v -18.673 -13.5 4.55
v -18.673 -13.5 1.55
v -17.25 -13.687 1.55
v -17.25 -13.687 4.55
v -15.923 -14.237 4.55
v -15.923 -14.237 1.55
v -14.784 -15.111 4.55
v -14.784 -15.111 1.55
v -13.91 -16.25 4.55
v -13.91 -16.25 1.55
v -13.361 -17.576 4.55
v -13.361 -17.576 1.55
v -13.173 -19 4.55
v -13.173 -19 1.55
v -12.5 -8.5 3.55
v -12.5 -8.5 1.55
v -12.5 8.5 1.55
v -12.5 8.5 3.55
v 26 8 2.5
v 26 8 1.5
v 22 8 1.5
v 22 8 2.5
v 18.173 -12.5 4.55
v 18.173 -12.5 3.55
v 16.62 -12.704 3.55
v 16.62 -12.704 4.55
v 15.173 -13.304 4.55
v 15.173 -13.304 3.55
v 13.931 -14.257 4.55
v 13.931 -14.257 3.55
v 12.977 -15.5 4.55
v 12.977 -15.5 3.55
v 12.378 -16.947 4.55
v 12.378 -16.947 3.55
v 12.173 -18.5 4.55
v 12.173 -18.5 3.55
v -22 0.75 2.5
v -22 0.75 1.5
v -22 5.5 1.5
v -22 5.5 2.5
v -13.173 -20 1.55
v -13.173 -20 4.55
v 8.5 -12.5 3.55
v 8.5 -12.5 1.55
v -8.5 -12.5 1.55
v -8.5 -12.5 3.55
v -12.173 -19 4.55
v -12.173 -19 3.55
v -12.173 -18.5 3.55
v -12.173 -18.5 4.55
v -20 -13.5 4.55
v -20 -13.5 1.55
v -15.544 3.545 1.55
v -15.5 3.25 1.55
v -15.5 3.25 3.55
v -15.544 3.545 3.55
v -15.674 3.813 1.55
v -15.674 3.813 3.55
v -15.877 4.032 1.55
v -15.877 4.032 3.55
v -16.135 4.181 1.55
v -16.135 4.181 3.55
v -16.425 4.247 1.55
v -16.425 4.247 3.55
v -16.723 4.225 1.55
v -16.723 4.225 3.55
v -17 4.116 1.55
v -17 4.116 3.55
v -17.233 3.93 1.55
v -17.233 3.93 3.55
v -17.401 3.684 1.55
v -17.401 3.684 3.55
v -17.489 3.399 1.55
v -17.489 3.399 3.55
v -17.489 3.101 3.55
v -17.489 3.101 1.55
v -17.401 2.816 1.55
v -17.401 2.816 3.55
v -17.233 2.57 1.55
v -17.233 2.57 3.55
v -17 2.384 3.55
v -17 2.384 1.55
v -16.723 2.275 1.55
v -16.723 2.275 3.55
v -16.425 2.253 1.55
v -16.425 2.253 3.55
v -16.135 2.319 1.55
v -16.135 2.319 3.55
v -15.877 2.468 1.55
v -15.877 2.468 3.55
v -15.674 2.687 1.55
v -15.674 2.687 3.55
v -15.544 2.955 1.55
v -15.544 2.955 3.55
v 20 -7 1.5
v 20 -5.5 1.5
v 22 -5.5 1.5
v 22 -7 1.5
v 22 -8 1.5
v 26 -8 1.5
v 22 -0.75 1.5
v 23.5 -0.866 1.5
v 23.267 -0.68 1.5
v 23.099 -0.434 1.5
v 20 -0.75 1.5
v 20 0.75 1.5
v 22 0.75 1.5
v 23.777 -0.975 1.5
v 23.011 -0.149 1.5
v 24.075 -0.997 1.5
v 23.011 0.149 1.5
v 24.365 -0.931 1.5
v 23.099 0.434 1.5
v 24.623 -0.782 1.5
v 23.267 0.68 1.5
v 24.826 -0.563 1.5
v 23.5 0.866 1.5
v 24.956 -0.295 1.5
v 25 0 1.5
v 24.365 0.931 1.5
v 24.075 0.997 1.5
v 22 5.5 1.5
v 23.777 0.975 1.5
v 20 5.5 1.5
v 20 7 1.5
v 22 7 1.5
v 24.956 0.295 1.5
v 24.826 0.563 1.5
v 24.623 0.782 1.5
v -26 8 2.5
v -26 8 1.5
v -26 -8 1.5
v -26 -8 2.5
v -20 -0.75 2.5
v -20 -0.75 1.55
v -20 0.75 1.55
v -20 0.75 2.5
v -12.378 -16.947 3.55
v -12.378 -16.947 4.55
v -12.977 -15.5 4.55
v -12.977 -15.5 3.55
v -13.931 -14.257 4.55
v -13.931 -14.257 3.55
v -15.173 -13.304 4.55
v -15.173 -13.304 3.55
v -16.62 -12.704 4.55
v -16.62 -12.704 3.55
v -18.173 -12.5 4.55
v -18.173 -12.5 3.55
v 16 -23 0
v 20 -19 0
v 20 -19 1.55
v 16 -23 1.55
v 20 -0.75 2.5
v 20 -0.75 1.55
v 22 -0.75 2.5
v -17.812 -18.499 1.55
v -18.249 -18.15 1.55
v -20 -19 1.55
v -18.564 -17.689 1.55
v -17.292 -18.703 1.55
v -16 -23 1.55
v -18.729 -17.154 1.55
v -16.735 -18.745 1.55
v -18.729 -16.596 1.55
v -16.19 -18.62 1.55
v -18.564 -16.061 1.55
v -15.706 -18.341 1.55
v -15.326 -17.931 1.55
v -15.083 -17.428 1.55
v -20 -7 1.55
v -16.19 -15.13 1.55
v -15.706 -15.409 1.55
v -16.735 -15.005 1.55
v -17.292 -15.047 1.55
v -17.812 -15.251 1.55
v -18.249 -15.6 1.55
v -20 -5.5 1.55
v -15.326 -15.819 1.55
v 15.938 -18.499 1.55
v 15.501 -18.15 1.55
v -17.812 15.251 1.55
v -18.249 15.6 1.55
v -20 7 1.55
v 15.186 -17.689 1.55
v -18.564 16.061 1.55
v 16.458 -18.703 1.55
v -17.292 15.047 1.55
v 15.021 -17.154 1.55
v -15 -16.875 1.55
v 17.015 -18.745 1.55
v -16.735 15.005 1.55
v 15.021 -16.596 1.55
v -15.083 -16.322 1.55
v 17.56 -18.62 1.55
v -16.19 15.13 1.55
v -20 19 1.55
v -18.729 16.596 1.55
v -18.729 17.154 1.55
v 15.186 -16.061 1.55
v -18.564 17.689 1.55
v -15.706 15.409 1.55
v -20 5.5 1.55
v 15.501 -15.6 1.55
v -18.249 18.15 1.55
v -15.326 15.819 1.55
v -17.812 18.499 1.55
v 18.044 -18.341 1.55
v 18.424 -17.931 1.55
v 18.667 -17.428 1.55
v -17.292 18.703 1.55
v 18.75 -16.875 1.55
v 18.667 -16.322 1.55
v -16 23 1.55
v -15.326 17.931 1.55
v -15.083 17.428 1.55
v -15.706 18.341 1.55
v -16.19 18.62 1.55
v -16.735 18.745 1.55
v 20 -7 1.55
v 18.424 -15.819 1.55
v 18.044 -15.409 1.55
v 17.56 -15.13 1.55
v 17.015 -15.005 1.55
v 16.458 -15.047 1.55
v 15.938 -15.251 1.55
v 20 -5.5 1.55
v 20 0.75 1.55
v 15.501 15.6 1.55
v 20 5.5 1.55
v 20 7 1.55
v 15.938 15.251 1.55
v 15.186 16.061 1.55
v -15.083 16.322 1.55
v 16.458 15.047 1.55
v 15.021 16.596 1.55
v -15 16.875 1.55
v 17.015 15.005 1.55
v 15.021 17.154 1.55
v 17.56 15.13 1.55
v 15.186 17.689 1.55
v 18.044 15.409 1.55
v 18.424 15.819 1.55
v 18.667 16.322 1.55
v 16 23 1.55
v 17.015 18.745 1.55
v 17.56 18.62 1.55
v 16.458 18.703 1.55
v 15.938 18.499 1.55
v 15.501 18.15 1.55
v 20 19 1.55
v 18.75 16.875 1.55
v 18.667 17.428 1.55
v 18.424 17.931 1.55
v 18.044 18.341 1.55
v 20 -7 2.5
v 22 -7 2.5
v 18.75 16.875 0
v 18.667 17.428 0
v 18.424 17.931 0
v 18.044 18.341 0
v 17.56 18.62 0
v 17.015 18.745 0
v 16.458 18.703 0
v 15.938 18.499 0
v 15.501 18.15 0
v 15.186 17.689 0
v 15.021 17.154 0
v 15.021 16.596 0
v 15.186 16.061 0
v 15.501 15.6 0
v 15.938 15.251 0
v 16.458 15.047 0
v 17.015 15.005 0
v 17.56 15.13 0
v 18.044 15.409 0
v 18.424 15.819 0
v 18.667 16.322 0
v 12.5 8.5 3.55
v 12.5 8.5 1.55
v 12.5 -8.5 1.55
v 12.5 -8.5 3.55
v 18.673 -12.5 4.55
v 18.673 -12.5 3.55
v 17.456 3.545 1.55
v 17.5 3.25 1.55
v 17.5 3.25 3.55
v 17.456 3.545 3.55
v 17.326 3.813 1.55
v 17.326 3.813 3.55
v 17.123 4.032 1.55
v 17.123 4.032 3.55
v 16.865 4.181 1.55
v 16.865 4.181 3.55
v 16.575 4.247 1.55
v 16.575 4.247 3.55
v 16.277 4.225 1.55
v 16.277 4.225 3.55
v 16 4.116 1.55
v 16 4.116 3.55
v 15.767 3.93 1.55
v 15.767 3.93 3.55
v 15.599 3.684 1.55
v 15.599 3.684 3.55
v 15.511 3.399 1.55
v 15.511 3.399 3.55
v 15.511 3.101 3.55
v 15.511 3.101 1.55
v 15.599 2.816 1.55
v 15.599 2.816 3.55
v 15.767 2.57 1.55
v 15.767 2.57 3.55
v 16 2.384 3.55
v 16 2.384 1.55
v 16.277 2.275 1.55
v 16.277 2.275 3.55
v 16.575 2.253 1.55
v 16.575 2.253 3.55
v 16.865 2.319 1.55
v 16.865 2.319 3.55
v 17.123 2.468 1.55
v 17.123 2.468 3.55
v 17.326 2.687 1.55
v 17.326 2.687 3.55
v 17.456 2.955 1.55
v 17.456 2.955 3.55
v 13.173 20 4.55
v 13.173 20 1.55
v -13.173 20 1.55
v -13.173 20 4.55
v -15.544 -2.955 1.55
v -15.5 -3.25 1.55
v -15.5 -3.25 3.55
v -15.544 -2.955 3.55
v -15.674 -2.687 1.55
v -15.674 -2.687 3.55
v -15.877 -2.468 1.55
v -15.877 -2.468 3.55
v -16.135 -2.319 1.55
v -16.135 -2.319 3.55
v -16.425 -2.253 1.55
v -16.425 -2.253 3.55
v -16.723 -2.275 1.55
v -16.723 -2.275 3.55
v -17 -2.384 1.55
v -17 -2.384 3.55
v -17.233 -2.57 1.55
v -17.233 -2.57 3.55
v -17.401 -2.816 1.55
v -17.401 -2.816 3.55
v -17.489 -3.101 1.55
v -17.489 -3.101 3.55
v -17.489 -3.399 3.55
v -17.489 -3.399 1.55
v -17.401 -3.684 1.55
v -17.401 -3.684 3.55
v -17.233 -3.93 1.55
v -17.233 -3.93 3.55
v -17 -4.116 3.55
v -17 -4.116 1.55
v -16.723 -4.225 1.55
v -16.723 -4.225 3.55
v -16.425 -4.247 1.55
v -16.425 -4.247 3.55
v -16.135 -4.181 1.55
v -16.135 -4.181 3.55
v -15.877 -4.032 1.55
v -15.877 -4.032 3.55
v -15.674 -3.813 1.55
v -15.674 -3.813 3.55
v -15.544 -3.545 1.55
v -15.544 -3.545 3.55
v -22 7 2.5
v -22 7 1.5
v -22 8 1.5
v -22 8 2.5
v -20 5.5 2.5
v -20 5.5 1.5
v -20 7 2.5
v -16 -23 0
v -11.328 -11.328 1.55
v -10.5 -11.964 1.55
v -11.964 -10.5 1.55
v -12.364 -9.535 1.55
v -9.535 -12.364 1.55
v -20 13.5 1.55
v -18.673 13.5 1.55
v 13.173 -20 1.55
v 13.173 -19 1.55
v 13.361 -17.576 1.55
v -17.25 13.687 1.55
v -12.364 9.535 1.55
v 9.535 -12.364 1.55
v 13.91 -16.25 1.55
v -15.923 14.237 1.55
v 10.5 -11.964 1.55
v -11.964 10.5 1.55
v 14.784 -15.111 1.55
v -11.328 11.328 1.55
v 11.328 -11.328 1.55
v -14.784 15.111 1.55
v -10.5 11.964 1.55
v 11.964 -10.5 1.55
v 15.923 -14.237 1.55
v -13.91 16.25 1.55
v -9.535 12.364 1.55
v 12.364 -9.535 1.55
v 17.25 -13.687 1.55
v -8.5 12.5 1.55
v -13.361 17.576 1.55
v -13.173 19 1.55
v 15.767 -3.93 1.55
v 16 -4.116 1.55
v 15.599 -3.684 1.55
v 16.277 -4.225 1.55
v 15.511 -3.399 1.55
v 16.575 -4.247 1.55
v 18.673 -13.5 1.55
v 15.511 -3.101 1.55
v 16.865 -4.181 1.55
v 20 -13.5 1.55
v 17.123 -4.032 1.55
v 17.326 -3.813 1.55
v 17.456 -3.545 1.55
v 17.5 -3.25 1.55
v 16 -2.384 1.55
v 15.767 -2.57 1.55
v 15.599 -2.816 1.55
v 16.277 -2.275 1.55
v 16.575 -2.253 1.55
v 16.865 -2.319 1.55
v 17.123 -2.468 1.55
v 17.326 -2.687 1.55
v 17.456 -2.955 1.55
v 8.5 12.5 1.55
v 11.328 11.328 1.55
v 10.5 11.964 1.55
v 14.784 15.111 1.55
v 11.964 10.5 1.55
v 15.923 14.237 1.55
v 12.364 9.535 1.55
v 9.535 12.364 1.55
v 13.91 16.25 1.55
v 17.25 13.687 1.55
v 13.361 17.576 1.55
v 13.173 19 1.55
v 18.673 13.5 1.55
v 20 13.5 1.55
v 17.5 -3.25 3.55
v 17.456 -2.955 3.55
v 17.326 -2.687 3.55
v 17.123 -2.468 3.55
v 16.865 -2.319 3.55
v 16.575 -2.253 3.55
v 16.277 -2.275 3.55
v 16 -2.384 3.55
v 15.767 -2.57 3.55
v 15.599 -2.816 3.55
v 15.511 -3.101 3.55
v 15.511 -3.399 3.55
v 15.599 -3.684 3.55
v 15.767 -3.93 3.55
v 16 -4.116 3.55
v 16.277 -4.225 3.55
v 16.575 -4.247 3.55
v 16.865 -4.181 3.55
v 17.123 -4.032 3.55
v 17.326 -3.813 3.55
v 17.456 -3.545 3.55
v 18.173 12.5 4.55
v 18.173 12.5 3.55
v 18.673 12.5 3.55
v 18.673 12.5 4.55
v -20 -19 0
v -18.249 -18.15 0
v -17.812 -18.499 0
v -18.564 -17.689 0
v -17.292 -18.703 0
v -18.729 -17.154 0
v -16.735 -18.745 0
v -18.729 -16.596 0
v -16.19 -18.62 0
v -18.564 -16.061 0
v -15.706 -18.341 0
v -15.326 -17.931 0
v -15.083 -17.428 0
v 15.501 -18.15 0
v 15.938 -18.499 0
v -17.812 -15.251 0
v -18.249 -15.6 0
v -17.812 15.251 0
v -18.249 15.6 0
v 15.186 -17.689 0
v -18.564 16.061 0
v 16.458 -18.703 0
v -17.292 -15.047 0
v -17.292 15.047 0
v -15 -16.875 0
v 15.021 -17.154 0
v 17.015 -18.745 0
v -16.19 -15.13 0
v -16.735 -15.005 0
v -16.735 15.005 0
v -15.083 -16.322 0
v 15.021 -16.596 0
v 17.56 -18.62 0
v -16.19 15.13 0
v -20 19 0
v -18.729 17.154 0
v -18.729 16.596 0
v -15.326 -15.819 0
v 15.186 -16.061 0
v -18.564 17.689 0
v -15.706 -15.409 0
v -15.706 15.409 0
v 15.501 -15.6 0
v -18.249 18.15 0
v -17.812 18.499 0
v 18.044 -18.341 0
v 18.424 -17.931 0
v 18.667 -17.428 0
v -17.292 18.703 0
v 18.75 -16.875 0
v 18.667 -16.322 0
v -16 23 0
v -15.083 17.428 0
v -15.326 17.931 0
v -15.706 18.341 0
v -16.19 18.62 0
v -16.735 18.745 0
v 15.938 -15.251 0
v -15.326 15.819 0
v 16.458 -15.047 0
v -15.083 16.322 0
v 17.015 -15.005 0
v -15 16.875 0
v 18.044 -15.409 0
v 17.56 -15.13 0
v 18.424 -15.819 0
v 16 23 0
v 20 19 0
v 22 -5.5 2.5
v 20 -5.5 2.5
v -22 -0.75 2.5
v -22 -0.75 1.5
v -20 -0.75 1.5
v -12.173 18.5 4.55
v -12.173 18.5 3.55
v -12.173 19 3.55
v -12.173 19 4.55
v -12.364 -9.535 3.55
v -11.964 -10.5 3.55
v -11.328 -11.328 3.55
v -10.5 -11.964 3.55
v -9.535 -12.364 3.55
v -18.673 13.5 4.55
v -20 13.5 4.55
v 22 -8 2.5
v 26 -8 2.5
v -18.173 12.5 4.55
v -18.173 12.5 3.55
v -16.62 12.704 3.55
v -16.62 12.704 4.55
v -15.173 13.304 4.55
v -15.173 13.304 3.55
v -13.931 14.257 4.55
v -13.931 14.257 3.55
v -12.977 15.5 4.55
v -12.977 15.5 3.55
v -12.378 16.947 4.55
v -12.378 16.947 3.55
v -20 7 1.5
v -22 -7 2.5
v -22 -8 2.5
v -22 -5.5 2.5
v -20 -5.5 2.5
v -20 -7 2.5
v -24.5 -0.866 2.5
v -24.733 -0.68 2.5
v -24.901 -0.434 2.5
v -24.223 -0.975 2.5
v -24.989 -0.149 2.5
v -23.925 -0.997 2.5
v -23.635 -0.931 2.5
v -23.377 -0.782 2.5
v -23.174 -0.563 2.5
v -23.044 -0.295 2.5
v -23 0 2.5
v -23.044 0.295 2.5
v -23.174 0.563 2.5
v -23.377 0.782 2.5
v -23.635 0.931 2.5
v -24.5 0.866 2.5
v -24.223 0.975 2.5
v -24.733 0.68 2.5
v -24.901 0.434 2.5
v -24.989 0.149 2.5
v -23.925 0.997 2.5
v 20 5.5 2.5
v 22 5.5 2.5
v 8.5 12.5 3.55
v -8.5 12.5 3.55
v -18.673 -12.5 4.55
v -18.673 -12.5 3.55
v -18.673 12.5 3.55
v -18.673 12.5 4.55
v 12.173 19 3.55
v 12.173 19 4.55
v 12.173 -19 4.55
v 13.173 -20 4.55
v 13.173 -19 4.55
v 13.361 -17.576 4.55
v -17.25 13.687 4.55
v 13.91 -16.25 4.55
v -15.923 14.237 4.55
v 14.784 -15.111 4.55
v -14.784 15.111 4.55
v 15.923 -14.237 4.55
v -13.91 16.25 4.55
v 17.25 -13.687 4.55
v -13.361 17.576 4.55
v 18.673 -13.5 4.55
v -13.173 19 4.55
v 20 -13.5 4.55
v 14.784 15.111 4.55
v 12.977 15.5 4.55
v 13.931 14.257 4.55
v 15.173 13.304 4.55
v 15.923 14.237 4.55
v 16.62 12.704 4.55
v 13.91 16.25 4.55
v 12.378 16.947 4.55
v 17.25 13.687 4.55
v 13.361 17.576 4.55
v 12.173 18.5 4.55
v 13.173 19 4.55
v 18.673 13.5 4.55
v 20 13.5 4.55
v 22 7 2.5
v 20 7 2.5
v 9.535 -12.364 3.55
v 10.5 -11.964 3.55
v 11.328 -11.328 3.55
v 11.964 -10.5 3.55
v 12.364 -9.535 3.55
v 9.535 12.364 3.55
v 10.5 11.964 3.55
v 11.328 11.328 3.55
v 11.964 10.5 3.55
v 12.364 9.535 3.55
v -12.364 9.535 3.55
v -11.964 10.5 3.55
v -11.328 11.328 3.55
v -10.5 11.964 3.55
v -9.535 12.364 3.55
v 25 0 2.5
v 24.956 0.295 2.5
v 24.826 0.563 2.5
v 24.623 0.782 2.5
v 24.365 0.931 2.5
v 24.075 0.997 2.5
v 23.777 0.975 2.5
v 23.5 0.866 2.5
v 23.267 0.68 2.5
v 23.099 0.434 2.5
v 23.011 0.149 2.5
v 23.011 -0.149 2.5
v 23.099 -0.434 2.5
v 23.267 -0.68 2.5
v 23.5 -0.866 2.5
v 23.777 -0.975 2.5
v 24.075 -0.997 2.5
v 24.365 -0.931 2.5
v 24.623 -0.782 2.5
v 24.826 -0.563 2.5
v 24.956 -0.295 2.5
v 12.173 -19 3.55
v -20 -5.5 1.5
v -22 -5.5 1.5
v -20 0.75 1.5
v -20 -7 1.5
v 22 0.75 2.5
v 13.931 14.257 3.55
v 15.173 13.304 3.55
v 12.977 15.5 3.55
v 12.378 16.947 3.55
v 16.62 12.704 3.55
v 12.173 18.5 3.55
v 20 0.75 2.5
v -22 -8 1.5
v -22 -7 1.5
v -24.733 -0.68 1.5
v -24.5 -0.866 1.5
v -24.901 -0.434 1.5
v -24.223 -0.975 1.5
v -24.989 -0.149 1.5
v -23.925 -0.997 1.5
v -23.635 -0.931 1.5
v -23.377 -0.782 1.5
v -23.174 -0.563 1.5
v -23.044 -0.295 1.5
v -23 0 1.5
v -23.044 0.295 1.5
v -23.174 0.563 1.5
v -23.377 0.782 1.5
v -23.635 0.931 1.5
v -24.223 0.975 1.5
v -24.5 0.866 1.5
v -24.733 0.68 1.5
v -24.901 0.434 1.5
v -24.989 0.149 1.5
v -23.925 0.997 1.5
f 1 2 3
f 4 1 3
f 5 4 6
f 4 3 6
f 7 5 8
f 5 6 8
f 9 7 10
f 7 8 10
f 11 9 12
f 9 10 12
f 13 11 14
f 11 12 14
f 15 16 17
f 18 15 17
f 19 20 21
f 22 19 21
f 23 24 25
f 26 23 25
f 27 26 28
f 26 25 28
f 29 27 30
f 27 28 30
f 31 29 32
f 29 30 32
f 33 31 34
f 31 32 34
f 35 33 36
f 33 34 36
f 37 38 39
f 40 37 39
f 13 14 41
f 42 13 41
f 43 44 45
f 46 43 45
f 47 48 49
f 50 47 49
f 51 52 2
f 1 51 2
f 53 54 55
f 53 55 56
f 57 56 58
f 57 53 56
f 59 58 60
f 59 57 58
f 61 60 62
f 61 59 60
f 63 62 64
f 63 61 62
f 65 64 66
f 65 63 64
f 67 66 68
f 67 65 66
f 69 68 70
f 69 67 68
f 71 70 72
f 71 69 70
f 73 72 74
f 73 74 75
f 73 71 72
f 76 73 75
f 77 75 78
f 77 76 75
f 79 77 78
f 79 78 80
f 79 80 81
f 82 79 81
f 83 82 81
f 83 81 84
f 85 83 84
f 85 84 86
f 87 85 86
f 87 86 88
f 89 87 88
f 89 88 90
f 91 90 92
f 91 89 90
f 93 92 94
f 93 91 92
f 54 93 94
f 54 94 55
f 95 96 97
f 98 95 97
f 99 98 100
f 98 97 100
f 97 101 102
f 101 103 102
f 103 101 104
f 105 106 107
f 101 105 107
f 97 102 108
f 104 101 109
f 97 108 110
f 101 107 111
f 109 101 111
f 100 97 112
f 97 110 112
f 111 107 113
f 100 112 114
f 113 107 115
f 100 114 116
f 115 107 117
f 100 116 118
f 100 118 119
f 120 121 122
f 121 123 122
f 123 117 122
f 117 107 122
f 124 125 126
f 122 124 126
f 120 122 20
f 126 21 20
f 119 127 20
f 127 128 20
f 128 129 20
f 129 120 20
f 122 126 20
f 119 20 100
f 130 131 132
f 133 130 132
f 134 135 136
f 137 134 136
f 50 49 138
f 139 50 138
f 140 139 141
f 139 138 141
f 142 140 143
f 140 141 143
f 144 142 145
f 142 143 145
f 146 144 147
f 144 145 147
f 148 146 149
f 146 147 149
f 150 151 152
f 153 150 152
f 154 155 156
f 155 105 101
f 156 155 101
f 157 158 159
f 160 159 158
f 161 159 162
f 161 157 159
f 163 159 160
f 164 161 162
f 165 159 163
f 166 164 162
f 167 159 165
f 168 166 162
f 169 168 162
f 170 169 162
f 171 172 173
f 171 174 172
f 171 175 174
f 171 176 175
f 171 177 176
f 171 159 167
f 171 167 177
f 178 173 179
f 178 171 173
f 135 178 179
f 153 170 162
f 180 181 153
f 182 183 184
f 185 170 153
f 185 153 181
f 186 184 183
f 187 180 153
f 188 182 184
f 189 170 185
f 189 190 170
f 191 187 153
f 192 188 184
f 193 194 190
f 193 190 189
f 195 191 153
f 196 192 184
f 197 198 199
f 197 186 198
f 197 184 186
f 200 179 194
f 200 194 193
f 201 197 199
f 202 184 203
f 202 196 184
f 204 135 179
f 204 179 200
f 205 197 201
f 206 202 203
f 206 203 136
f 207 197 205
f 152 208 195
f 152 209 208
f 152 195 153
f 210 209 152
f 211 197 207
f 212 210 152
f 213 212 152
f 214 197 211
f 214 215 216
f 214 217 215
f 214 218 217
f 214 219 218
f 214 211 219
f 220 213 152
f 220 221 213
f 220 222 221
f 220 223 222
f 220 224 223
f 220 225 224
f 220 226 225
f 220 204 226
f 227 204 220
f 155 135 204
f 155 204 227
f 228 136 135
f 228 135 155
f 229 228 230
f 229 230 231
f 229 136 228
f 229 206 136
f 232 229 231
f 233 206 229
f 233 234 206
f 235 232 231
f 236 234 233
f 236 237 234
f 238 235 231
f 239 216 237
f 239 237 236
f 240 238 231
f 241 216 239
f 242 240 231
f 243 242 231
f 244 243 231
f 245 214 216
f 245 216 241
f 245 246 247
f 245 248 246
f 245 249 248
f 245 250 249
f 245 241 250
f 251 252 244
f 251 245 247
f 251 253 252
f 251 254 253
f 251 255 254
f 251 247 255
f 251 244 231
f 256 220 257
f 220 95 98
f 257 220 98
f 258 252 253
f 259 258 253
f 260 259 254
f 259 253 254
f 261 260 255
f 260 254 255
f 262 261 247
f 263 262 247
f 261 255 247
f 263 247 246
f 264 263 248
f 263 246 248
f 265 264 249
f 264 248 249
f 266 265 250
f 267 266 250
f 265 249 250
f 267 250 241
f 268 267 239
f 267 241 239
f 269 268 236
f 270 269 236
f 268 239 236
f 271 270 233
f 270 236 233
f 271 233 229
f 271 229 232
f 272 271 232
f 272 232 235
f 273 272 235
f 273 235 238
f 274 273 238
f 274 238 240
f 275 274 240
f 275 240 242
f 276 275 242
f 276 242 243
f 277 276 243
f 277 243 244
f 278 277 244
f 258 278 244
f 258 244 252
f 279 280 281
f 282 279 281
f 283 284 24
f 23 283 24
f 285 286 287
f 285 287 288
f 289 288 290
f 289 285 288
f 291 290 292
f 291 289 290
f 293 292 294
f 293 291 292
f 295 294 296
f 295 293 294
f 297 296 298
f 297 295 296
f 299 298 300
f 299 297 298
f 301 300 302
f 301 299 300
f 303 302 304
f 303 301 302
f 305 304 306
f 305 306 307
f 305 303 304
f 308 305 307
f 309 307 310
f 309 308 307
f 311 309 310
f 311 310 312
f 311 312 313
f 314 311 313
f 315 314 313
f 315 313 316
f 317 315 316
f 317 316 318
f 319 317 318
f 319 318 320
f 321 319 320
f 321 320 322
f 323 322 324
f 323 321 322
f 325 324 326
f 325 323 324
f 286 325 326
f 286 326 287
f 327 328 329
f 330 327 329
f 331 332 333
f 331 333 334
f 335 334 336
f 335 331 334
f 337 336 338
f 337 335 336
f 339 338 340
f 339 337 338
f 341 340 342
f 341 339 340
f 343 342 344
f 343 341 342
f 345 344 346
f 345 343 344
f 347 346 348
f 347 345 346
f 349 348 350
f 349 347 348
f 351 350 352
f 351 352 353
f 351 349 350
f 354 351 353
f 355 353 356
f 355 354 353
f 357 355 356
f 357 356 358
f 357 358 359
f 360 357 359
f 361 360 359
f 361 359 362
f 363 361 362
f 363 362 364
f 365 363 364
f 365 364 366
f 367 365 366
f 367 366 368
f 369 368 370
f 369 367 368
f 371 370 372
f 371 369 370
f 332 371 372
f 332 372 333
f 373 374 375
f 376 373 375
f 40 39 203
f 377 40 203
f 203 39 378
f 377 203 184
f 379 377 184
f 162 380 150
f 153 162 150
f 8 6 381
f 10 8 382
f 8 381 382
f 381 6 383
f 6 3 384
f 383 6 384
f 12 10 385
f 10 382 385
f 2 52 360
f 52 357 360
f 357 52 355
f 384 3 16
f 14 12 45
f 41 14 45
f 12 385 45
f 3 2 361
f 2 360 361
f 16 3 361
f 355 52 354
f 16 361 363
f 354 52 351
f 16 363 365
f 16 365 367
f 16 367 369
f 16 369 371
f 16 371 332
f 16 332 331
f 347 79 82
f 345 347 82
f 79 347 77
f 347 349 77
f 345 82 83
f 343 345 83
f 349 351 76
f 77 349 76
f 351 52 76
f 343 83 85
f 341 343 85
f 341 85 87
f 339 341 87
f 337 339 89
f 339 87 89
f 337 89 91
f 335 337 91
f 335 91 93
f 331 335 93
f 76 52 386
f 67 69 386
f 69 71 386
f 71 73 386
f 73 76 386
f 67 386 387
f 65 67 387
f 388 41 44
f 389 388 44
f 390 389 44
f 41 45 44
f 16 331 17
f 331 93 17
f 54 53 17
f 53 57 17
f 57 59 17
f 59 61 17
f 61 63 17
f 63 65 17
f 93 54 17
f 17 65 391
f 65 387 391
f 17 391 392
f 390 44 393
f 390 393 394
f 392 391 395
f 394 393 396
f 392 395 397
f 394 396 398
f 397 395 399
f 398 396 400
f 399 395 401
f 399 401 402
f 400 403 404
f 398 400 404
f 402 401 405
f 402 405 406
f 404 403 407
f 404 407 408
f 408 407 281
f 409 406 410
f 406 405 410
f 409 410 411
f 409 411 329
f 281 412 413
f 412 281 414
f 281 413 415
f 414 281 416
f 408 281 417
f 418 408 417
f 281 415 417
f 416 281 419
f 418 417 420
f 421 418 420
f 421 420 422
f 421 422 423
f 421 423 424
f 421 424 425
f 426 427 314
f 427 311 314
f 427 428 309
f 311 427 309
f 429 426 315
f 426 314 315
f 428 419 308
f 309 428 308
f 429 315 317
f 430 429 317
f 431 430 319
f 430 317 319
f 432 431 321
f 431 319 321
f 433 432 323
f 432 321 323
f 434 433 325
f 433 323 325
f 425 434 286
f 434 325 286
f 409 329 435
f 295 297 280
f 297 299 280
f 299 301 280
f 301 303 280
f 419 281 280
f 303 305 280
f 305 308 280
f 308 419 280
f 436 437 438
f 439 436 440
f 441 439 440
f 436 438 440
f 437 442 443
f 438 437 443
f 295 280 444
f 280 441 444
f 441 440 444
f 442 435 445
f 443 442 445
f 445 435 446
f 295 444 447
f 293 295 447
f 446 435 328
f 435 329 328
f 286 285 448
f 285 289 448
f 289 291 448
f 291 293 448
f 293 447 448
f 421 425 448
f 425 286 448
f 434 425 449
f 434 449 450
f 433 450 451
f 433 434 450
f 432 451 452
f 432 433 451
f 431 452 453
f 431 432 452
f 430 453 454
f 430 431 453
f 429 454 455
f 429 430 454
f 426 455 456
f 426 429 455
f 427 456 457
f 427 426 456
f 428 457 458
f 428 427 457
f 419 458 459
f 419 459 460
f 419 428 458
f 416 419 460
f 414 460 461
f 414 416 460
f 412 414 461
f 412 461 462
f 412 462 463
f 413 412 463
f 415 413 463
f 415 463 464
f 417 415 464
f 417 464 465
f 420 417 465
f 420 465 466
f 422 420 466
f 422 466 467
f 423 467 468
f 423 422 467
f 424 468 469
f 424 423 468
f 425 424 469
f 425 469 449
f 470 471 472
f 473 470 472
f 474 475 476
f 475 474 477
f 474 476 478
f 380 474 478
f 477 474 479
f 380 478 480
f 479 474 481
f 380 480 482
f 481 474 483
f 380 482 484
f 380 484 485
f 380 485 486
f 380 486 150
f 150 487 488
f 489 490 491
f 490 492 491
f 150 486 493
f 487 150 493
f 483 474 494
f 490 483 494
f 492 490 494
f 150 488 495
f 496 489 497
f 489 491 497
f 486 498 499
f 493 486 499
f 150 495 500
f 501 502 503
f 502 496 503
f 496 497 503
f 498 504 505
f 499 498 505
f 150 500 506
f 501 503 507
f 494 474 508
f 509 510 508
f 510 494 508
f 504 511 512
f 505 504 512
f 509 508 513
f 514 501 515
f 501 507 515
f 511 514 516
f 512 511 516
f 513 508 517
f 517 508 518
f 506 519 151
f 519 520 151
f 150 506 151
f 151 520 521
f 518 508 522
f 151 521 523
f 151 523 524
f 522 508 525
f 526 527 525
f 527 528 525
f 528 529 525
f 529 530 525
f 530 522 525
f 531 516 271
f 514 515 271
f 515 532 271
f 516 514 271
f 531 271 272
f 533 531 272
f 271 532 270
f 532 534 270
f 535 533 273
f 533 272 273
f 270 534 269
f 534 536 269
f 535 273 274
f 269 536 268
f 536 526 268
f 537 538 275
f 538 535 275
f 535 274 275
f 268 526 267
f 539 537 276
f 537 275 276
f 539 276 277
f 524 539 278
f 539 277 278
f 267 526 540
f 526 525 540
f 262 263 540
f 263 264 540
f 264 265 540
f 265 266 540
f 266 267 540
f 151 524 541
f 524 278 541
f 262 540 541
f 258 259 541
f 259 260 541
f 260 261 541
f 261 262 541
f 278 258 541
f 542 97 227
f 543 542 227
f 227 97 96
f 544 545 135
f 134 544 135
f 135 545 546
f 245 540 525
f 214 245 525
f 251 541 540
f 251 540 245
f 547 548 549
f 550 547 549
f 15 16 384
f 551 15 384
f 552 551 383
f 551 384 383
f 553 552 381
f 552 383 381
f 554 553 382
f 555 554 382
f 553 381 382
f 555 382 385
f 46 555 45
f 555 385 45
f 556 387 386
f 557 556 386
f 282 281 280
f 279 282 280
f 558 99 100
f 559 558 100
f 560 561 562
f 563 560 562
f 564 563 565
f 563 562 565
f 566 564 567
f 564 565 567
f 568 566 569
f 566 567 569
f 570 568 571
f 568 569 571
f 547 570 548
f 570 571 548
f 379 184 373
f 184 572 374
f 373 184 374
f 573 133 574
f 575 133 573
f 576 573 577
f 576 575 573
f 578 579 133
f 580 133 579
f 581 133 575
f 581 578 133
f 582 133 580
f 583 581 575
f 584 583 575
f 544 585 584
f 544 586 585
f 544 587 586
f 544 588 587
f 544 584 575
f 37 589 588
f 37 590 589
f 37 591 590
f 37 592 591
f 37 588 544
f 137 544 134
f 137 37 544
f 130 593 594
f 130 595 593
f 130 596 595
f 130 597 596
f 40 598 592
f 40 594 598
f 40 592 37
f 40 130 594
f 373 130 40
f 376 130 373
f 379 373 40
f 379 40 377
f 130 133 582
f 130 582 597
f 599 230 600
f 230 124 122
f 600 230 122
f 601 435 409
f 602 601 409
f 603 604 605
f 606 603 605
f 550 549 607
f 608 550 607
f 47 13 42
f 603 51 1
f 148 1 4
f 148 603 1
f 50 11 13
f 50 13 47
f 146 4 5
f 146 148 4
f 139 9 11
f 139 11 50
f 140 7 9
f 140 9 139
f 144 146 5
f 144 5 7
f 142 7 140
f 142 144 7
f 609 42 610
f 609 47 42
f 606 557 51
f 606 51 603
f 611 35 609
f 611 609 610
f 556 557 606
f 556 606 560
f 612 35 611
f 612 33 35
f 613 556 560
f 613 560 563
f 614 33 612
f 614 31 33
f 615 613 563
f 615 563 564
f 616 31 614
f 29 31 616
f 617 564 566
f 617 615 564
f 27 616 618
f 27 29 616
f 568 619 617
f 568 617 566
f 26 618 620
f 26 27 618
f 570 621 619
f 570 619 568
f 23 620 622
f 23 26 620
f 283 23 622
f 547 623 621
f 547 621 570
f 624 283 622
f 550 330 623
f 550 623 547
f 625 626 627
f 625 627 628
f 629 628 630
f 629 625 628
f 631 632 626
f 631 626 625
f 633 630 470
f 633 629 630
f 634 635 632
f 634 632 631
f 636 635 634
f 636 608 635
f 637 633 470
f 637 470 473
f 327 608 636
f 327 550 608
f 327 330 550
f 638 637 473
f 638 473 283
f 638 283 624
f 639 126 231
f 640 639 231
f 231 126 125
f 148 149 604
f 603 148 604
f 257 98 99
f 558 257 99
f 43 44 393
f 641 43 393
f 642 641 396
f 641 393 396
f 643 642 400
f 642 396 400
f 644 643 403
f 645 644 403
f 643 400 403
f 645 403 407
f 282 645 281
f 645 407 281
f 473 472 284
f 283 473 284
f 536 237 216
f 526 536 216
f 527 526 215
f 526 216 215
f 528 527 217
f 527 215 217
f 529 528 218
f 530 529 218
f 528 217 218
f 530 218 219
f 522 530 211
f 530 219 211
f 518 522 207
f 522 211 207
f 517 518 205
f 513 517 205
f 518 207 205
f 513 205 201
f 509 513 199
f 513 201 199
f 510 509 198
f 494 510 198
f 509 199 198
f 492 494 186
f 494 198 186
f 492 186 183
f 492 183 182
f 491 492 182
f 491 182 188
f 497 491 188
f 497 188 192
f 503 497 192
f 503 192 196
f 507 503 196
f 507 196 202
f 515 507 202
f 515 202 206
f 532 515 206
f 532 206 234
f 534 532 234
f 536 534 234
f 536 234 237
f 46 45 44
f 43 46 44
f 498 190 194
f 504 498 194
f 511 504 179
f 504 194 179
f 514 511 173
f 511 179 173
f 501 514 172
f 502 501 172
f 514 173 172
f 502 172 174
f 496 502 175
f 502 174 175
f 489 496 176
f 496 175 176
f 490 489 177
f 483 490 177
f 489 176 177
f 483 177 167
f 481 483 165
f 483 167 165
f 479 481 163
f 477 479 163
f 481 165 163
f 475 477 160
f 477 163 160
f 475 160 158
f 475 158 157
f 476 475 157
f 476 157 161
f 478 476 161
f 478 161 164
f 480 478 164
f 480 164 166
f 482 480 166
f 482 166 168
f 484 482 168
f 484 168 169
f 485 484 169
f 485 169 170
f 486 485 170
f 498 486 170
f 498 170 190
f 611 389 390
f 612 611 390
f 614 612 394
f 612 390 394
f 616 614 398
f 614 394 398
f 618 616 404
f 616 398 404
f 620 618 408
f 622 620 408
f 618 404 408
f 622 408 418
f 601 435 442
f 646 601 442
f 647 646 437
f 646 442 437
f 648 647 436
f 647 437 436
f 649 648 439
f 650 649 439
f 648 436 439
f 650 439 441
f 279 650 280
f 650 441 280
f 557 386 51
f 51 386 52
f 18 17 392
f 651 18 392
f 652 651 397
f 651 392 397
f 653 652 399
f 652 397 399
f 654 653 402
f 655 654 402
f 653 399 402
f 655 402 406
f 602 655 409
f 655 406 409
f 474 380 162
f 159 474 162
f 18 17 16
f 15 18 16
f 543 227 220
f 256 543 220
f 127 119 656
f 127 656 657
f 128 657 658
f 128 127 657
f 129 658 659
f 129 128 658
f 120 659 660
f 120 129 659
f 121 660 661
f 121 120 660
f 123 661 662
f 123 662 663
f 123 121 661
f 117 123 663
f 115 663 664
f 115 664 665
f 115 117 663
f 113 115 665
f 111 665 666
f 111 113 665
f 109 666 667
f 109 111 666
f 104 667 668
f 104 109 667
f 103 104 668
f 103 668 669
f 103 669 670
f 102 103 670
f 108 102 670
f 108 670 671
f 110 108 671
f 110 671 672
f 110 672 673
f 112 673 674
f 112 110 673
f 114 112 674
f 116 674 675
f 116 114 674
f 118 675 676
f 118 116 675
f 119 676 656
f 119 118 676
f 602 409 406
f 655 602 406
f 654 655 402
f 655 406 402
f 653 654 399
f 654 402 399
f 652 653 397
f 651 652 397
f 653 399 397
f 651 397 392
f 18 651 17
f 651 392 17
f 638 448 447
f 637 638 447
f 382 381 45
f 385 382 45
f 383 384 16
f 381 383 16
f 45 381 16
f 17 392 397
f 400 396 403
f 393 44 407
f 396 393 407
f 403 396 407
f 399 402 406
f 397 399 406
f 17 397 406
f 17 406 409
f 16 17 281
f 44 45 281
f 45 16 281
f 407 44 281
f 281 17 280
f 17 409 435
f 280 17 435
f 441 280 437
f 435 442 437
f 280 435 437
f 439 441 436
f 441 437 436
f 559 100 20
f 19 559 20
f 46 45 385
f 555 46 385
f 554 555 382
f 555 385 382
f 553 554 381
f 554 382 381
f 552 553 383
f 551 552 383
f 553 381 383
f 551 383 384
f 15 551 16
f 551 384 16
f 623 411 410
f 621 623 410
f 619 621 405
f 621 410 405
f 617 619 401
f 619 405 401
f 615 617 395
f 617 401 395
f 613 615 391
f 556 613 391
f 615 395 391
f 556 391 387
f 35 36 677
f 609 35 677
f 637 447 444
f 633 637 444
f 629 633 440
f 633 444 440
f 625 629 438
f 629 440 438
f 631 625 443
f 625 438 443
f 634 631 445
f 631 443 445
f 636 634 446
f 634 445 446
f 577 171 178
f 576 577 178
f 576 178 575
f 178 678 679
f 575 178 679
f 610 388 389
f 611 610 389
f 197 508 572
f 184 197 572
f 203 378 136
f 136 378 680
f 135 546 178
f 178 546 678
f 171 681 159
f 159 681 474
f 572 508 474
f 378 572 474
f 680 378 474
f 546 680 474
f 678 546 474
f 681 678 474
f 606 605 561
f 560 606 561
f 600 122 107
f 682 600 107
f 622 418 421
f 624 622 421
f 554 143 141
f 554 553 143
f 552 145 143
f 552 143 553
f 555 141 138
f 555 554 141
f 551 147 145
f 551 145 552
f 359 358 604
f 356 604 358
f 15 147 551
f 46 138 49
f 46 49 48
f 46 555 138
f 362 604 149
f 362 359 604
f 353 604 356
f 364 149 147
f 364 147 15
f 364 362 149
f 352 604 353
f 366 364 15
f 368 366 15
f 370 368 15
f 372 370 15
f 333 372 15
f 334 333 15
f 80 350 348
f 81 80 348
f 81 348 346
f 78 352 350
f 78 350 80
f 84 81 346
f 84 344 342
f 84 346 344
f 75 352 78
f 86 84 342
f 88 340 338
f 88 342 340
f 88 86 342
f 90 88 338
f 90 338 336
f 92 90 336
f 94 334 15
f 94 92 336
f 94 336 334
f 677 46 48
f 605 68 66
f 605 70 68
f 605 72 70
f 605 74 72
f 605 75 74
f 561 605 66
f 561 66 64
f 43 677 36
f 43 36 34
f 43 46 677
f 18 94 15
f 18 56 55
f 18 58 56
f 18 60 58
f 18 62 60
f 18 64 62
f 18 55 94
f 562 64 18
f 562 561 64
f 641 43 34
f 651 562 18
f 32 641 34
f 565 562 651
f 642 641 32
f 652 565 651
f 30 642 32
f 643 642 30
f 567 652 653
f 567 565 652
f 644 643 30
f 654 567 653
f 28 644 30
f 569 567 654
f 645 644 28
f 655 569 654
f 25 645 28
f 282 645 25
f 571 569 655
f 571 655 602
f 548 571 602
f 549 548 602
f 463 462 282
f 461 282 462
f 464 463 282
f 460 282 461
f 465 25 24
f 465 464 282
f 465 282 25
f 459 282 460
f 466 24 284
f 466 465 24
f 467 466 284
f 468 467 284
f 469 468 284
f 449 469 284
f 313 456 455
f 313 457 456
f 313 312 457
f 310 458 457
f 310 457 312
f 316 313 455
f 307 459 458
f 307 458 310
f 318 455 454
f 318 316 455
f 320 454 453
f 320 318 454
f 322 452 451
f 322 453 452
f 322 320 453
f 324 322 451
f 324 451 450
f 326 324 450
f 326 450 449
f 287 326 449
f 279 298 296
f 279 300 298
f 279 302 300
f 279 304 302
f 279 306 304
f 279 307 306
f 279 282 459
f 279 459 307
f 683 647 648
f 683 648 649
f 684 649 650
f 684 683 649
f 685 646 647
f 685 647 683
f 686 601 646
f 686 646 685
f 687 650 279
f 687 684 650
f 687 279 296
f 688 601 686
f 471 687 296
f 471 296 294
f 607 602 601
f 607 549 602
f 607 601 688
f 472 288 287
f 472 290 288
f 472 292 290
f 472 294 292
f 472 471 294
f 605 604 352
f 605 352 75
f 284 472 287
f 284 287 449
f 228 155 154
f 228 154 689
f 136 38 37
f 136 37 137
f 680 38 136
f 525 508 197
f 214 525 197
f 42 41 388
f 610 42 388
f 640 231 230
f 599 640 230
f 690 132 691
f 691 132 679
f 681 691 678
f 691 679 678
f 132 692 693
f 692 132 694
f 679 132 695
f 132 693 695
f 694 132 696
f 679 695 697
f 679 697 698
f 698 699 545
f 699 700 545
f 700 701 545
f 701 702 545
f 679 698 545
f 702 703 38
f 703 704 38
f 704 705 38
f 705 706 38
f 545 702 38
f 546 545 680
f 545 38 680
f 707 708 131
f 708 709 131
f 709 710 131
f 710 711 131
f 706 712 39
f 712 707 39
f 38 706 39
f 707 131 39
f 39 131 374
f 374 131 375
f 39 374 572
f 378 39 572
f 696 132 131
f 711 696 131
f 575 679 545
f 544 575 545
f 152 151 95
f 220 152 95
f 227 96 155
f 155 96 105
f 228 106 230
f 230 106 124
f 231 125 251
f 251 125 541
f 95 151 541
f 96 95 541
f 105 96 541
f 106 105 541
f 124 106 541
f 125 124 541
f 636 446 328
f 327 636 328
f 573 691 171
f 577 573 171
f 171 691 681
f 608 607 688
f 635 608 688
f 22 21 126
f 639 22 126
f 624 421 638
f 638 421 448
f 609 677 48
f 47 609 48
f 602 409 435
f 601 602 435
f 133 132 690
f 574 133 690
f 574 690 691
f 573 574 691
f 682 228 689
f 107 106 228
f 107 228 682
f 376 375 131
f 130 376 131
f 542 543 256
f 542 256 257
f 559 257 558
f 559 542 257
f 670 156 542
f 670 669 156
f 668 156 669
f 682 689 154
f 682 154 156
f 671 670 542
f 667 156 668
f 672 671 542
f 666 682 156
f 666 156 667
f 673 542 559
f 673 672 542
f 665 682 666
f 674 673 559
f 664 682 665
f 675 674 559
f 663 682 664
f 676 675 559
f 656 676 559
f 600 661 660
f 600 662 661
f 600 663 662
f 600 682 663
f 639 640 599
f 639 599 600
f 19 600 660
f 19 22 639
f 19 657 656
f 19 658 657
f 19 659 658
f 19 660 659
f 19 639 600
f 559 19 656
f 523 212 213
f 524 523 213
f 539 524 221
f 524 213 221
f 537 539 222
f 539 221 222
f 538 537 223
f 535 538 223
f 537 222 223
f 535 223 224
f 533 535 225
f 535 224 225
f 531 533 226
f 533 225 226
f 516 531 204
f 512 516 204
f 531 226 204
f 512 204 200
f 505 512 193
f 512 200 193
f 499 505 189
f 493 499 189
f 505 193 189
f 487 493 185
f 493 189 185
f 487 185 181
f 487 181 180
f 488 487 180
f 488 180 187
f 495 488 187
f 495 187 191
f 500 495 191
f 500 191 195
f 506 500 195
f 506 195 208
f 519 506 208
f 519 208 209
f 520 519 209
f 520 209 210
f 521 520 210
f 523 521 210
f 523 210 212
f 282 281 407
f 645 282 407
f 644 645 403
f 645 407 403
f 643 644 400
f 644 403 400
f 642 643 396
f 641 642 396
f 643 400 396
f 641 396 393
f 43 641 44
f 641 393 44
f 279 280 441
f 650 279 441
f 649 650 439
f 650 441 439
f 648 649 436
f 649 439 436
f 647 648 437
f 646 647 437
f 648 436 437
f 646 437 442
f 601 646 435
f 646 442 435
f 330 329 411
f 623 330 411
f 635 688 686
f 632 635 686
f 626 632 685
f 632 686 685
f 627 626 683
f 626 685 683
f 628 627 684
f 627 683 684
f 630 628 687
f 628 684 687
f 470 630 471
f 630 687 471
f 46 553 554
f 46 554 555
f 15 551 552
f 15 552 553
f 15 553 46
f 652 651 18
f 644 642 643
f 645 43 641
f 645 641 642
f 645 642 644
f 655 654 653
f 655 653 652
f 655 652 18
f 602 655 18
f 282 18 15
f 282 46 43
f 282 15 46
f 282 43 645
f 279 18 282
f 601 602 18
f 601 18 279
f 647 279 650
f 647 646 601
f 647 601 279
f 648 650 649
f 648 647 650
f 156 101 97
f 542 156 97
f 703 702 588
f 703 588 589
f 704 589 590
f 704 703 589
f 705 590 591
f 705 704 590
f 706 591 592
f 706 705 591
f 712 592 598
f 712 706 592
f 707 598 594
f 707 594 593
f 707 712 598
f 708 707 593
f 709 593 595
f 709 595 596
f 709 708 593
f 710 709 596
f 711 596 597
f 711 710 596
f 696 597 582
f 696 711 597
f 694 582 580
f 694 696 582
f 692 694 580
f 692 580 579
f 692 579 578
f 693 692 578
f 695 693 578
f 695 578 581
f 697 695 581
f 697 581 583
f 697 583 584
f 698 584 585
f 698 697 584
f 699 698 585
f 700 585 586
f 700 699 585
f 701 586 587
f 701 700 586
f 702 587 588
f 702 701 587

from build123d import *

# Parameters (mm, degrees)
F1_DEPTH = 1.55
F3_SIZE  = 4
F4_R     = 1.875
F5_DEPTH = 4
F6_DEPTH = 3
F2_R     = 1
F2_W     = 1.5
F2_H     = 0.5
F2_W_2   = 0.5
F2_H_2   = 1.5219762474
F2_H_3   = 1.4780237526
F7_DEPTH = 2
F8_DEPTH = 2
F9_START = 1.5
F0_R     = 1
F0_W     = 2
F0_H     = 1.5
F9_DEPTH = 1


with BuildPart() as f1:
    # F0 (on Top) → F1 (new body)
    with BuildSketch(Plane.XY):
        Polygon((20, 23), (-20, 23), (-20, 7), (-20, 5.5), (-20, 0.75), (-20, -0.75), (-20, -5.5), (-20, -7), (-20, -23), (20, -23), (20, -7), (20, -5.5), (20, -0.75), (20, 0.75), (20, 5.5), (20, 7), align=None)
    extrude(amount=F1_DEPTH)

    # F3
    f3_edges = [f1.edges().sort_by_distance(p)[0] for p in [
        (-20, 23, 0.775),
        (20, 23, 0.775),
        (20, -23, 0.775),
        (-20, -23, 0.775),
    ]]
    chamfer(f3_edges, length=F3_SIZE)

    # F4 (on face) → F5 (cut)
    with BuildSketch(Plane.XY.offset(1.55)):
        with Locations((-16.875, -16.875)):
            Circle(F4_R)
        with Locations((16.875, -16.875)):
            Circle(F4_R)
        with Locations((16.875, 16.875)):
            Circle(F4_R)
        with Locations((-16.875, 16.875)):
            Circle(F4_R)
    extrude(amount=-F5_DEPTH, mode=Mode.SUBTRACT)

    # F0 (on Top) → F9 (join)
    with BuildSketch(Plane.XY.offset(F9_START)):
        Polygon((-20, 5.5), (-20, 7), (-22, 7), (-22, 8), (-26, 8), (-26, -8), (-22, -8), (-22, -7), (-20, -7), (-20, -5.5), (-22, -5.5), (-22, -0.75), (-22, 0.75), (-22, 5.5), align=None)
        with Locations((-24, 0)):
            Circle(F0_R, mode=Mode.SUBTRACT)
        Polygon((22, 7), (20, 7), (20, 5.5), (22, 5.5), (22, 0.75), (22, -0.75), (22, -5.5), (20, -5.5), (20, -7), (22, -7), (22, -8), (26, -8), (26, 8), (22, 8), align=None)
        with Locations((24, 0)):
            Circle(F0_R, mode=Mode.SUBTRACT)
        with Locations((21, 0)):
            Rectangle(F0_W, F0_H)
        with Locations((-21, 0)):
            Rectangle(F0_W, F0_H)
    extrude(amount=F9_DEPTH)


with BuildPart() as f6:
    # F2 (on face) → F6 (new body)
    with BuildSketch(Plane.XY.offset(1.55)):
        with BuildLine():
            Line((13.1731458455, 20), (-13.1731458455, 20))
            Line((-13.1731458455, 20), (-13.1731458455, 19))
            ThreePointArc((-13.1731458455, 19), (-14.784058549, 15.1109127035), (-18.6731458455, 13.5))
            Line((-18.6731458455, 13.5), (-20, 13.5))
            Line((-20, 13.5), (-20, -13.5))
            Line((-20, -13.5), (-18.6731458455, -13.5))
            ThreePointArc((-18.6731458455, -13.5), (-14.784058549, -15.1109127035), (-13.1731458455, -19))
            Line((-13.1731458455, -19), (-13.1731458455, -20))
            Line((-13.1731458455, -20), (13.1731458455, -20))
            Line((13.1731458455, -20), (13.1731458455, -19))
            ThreePointArc((13.1731458455, -19), (14.784058549, -15.1109127035), (18.6731458455, -13.5))
            Line((18.6731458455, -13.5), (20, -13.5))
            Line((20, -13.5), (20, 13.5))
            Line((20, 13.5), (18.6731458455, 13.5))
            ThreePointArc((18.6731458455, 13.5), (14.784058549, 15.1109127035), (13.1731458455, 19))
            Line((13.1731458455, 19), (13.1731458455, 20))
        make_face()
        with BuildLine():
            Line((-12.1731458455, 18.5), (-12.1731458455, 19))
            Line((-12.1731458455, 19), (12.1731458455, 19))
            Line((12.1731458455, 19), (12.1731458455, 18.5))
            ThreePointArc((12.1731458455, 18.5), (13.9305051584, 14.2573593129), (18.1731458455, 12.5))
            Line((18.1731458455, 12.5), (18.6731458455, 12.5))
            Line((18.6731458455, 12.5), (18.6731458455, -12.5))
            Line((18.6731458455, -12.5), (18.1731458455, -12.5))
            ThreePointArc((18.1731458455, -12.5), (13.9305051584, -14.2573593129), (12.1731458455, -18.5))
            Line((12.1731458455, -18.5), (12.1731458455, -19))
            Line((12.1731458455, -19), (-12.1731458455, -19))
            Line((-12.1731458455, -19), (-12.1731458455, -18.5))
            ThreePointArc((-12.1731458455, -18.5), (-13.9305051584, -14.2573593129), (-18.1731458455, -12.5))
            Line((-18.1731458455, -12.5), (-18.6731458455, -12.5))
            Line((-18.6731458455, -12.5), (-18.6731458455, 12.5))
            Line((-18.6731458455, 12.5), (-18.1731458455, 12.5))
            ThreePointArc((-18.1731458455, 12.5), (-13.9305051584, 14.2573593129), (-12.1731458455, 18.5))
        make_face(mode=Mode.SUBTRACT)
    extrude(amount=F6_DEPTH)

    # F2 (on face) → F7 (join)
    with BuildSketch(Plane.XY.offset(1.55)):
        with BuildLine():
            Line((12.1731458455, 19), (-12.1731458455, 19))
            Line((-12.1731458455, 19), (-12.1731458455, 18.5))
            ThreePointArc((-12.1731458455, 18.5), (-13.9305051584, 14.2573593129), (-18.1731458455, 12.5))
            Line((-18.1731458455, 12.5), (-18.6731458455, 12.5))
            Line((-18.6731458455, 12.5), (-18.6731458455, -12.5))
            Line((-18.6731458455, -12.5), (-18.1731458455, -12.5))
            ThreePointArc((-18.1731458455, -12.5), (-13.9305051584, -14.2573593129), (-12.1731458455, -18.5))
            Line((-12.1731458455, -18.5), (-12.1731458455, -19))
            Line((-12.1731458455, -19), (12.1731458455, -19))
            Line((12.1731458455, -19), (12.1731458455, -18.5))
            ThreePointArc((12.1731458455, -18.5), (13.9305051584, -14.2573593129), (18.1731458455, -12.5))
            Line((18.1731458455, -12.5), (18.6731458455, -12.5))
            Line((18.6731458455, -12.5), (18.6731458455, 12.5))
            Line((18.6731458455, 12.5), (18.1731458455, 12.5))
            ThreePointArc((18.1731458455, 12.5), (13.9305051584, 14.2573593129), (12.1731458455, 18.5))
            Line((12.1731458455, 18.5), (12.1731458455, 19))
        make_face()
        Polygon((-9.1731458455, -16.4780237526), (-9.1731458455, -18), (-9.6731458455, -18), (-9.6731458455, -16.4780237526), (-11.1731458455, -16.4780237526), (-11.1731458455, -15.9780237526), (-9.6731458455, -15.9780237526), (-9.6731458455, -14.5), (-9.1731458455, -14.5), (-9.1731458455, -15.9780237526), (-7.6731458455, -15.9780237526), (-7.6731458455, -16.4780237526), align=None, mode=Mode.SUBTRACT)
        with Locations((-16.5, -3.25)):
            Circle(F2_R, mode=Mode.SUBTRACT)
        with Locations((16.5, -3.25)):
            Circle(F2_R, mode=Mode.SUBTRACT)
        with Locations((-16.5, 3.25)):
            Circle(F2_R, mode=Mode.SUBTRACT)
        with BuildLine():
            ThreePointArc((-12.5, 8.5), (-11.3284271247, 11.3284271247), (-8.5, 12.5))
            Line((-8.5, 12.5), (8.5, 12.5))
            ThreePointArc((8.5, 12.5), (11.3284271247, 11.3284271247), (12.5, 8.5))
            Line((12.5, 8.5), (12.5, -8.5))
            ThreePointArc((12.5, -8.5), (11.3284271247, -11.3284271247), (8.5, -12.5))
            Line((8.5, -12.5), (-8.5, -12.5))
            ThreePointArc((-8.5, -12.5), (-11.3284271247, -11.3284271247), (-12.5, -8.5))
            Line((-12.5, -8.5), (-12.5, 8.5))
        make_face(mode=Mode.SUBTRACT)
        with Locations((16.5, 3.25)):
            Circle(F2_R, mode=Mode.SUBTRACT)
        with Locations((-8.4231458455, -16.2280237526)):
            Rectangle(F2_W, F2_H)
        with Locations((-10.4231458455, -16.2280237526)):
            Rectangle(F2_W, F2_H)
        with Locations((-9.4231458455, -17.2390118763)):
            Rectangle(F2_W_2, F2_H_2)
        with Locations((-9.4231458455, -15.2390118763)):
            Rectangle(F2_W_2, F2_H_3)
        with Locations((-9.4231458455, -16.2280237526)):
            Rectangle(F2_W_2, F2_H)
    extrude(amount=F7_DEPTH)


with BuildPart() as f8:
    # F2 (on face) → F8 (new body)
    with BuildSketch(Plane.XY.offset(1.55)):
        with BuildLine():
            Line((8.5, 12.5), (-8.5, 12.5))
            ThreePointArc((-8.5, 12.5), (-11.3284271247, 11.3284271247), (-12.5, 8.5))
            Line((-12.5, 8.5), (-12.5, -8.5))
            ThreePointArc((-12.5, -8.5), (-11.3284271247, -11.3284271247), (-8.5, -12.5))
            Line((-8.5, -12.5), (8.5, -12.5))
            ThreePointArc((8.5, -12.5), (11.3284271247, -11.3284271247), (12.5, -8.5))
            Line((12.5, -8.5), (12.5, 8.5))
            ThreePointArc((12.5, 8.5), (11.3284271247, 11.3284271247), (8.5, 12.5))
        make_face()
    extrude(amount=F8_DEPTH)


solid = Compound([f1.part, f6.part, f8.part])
